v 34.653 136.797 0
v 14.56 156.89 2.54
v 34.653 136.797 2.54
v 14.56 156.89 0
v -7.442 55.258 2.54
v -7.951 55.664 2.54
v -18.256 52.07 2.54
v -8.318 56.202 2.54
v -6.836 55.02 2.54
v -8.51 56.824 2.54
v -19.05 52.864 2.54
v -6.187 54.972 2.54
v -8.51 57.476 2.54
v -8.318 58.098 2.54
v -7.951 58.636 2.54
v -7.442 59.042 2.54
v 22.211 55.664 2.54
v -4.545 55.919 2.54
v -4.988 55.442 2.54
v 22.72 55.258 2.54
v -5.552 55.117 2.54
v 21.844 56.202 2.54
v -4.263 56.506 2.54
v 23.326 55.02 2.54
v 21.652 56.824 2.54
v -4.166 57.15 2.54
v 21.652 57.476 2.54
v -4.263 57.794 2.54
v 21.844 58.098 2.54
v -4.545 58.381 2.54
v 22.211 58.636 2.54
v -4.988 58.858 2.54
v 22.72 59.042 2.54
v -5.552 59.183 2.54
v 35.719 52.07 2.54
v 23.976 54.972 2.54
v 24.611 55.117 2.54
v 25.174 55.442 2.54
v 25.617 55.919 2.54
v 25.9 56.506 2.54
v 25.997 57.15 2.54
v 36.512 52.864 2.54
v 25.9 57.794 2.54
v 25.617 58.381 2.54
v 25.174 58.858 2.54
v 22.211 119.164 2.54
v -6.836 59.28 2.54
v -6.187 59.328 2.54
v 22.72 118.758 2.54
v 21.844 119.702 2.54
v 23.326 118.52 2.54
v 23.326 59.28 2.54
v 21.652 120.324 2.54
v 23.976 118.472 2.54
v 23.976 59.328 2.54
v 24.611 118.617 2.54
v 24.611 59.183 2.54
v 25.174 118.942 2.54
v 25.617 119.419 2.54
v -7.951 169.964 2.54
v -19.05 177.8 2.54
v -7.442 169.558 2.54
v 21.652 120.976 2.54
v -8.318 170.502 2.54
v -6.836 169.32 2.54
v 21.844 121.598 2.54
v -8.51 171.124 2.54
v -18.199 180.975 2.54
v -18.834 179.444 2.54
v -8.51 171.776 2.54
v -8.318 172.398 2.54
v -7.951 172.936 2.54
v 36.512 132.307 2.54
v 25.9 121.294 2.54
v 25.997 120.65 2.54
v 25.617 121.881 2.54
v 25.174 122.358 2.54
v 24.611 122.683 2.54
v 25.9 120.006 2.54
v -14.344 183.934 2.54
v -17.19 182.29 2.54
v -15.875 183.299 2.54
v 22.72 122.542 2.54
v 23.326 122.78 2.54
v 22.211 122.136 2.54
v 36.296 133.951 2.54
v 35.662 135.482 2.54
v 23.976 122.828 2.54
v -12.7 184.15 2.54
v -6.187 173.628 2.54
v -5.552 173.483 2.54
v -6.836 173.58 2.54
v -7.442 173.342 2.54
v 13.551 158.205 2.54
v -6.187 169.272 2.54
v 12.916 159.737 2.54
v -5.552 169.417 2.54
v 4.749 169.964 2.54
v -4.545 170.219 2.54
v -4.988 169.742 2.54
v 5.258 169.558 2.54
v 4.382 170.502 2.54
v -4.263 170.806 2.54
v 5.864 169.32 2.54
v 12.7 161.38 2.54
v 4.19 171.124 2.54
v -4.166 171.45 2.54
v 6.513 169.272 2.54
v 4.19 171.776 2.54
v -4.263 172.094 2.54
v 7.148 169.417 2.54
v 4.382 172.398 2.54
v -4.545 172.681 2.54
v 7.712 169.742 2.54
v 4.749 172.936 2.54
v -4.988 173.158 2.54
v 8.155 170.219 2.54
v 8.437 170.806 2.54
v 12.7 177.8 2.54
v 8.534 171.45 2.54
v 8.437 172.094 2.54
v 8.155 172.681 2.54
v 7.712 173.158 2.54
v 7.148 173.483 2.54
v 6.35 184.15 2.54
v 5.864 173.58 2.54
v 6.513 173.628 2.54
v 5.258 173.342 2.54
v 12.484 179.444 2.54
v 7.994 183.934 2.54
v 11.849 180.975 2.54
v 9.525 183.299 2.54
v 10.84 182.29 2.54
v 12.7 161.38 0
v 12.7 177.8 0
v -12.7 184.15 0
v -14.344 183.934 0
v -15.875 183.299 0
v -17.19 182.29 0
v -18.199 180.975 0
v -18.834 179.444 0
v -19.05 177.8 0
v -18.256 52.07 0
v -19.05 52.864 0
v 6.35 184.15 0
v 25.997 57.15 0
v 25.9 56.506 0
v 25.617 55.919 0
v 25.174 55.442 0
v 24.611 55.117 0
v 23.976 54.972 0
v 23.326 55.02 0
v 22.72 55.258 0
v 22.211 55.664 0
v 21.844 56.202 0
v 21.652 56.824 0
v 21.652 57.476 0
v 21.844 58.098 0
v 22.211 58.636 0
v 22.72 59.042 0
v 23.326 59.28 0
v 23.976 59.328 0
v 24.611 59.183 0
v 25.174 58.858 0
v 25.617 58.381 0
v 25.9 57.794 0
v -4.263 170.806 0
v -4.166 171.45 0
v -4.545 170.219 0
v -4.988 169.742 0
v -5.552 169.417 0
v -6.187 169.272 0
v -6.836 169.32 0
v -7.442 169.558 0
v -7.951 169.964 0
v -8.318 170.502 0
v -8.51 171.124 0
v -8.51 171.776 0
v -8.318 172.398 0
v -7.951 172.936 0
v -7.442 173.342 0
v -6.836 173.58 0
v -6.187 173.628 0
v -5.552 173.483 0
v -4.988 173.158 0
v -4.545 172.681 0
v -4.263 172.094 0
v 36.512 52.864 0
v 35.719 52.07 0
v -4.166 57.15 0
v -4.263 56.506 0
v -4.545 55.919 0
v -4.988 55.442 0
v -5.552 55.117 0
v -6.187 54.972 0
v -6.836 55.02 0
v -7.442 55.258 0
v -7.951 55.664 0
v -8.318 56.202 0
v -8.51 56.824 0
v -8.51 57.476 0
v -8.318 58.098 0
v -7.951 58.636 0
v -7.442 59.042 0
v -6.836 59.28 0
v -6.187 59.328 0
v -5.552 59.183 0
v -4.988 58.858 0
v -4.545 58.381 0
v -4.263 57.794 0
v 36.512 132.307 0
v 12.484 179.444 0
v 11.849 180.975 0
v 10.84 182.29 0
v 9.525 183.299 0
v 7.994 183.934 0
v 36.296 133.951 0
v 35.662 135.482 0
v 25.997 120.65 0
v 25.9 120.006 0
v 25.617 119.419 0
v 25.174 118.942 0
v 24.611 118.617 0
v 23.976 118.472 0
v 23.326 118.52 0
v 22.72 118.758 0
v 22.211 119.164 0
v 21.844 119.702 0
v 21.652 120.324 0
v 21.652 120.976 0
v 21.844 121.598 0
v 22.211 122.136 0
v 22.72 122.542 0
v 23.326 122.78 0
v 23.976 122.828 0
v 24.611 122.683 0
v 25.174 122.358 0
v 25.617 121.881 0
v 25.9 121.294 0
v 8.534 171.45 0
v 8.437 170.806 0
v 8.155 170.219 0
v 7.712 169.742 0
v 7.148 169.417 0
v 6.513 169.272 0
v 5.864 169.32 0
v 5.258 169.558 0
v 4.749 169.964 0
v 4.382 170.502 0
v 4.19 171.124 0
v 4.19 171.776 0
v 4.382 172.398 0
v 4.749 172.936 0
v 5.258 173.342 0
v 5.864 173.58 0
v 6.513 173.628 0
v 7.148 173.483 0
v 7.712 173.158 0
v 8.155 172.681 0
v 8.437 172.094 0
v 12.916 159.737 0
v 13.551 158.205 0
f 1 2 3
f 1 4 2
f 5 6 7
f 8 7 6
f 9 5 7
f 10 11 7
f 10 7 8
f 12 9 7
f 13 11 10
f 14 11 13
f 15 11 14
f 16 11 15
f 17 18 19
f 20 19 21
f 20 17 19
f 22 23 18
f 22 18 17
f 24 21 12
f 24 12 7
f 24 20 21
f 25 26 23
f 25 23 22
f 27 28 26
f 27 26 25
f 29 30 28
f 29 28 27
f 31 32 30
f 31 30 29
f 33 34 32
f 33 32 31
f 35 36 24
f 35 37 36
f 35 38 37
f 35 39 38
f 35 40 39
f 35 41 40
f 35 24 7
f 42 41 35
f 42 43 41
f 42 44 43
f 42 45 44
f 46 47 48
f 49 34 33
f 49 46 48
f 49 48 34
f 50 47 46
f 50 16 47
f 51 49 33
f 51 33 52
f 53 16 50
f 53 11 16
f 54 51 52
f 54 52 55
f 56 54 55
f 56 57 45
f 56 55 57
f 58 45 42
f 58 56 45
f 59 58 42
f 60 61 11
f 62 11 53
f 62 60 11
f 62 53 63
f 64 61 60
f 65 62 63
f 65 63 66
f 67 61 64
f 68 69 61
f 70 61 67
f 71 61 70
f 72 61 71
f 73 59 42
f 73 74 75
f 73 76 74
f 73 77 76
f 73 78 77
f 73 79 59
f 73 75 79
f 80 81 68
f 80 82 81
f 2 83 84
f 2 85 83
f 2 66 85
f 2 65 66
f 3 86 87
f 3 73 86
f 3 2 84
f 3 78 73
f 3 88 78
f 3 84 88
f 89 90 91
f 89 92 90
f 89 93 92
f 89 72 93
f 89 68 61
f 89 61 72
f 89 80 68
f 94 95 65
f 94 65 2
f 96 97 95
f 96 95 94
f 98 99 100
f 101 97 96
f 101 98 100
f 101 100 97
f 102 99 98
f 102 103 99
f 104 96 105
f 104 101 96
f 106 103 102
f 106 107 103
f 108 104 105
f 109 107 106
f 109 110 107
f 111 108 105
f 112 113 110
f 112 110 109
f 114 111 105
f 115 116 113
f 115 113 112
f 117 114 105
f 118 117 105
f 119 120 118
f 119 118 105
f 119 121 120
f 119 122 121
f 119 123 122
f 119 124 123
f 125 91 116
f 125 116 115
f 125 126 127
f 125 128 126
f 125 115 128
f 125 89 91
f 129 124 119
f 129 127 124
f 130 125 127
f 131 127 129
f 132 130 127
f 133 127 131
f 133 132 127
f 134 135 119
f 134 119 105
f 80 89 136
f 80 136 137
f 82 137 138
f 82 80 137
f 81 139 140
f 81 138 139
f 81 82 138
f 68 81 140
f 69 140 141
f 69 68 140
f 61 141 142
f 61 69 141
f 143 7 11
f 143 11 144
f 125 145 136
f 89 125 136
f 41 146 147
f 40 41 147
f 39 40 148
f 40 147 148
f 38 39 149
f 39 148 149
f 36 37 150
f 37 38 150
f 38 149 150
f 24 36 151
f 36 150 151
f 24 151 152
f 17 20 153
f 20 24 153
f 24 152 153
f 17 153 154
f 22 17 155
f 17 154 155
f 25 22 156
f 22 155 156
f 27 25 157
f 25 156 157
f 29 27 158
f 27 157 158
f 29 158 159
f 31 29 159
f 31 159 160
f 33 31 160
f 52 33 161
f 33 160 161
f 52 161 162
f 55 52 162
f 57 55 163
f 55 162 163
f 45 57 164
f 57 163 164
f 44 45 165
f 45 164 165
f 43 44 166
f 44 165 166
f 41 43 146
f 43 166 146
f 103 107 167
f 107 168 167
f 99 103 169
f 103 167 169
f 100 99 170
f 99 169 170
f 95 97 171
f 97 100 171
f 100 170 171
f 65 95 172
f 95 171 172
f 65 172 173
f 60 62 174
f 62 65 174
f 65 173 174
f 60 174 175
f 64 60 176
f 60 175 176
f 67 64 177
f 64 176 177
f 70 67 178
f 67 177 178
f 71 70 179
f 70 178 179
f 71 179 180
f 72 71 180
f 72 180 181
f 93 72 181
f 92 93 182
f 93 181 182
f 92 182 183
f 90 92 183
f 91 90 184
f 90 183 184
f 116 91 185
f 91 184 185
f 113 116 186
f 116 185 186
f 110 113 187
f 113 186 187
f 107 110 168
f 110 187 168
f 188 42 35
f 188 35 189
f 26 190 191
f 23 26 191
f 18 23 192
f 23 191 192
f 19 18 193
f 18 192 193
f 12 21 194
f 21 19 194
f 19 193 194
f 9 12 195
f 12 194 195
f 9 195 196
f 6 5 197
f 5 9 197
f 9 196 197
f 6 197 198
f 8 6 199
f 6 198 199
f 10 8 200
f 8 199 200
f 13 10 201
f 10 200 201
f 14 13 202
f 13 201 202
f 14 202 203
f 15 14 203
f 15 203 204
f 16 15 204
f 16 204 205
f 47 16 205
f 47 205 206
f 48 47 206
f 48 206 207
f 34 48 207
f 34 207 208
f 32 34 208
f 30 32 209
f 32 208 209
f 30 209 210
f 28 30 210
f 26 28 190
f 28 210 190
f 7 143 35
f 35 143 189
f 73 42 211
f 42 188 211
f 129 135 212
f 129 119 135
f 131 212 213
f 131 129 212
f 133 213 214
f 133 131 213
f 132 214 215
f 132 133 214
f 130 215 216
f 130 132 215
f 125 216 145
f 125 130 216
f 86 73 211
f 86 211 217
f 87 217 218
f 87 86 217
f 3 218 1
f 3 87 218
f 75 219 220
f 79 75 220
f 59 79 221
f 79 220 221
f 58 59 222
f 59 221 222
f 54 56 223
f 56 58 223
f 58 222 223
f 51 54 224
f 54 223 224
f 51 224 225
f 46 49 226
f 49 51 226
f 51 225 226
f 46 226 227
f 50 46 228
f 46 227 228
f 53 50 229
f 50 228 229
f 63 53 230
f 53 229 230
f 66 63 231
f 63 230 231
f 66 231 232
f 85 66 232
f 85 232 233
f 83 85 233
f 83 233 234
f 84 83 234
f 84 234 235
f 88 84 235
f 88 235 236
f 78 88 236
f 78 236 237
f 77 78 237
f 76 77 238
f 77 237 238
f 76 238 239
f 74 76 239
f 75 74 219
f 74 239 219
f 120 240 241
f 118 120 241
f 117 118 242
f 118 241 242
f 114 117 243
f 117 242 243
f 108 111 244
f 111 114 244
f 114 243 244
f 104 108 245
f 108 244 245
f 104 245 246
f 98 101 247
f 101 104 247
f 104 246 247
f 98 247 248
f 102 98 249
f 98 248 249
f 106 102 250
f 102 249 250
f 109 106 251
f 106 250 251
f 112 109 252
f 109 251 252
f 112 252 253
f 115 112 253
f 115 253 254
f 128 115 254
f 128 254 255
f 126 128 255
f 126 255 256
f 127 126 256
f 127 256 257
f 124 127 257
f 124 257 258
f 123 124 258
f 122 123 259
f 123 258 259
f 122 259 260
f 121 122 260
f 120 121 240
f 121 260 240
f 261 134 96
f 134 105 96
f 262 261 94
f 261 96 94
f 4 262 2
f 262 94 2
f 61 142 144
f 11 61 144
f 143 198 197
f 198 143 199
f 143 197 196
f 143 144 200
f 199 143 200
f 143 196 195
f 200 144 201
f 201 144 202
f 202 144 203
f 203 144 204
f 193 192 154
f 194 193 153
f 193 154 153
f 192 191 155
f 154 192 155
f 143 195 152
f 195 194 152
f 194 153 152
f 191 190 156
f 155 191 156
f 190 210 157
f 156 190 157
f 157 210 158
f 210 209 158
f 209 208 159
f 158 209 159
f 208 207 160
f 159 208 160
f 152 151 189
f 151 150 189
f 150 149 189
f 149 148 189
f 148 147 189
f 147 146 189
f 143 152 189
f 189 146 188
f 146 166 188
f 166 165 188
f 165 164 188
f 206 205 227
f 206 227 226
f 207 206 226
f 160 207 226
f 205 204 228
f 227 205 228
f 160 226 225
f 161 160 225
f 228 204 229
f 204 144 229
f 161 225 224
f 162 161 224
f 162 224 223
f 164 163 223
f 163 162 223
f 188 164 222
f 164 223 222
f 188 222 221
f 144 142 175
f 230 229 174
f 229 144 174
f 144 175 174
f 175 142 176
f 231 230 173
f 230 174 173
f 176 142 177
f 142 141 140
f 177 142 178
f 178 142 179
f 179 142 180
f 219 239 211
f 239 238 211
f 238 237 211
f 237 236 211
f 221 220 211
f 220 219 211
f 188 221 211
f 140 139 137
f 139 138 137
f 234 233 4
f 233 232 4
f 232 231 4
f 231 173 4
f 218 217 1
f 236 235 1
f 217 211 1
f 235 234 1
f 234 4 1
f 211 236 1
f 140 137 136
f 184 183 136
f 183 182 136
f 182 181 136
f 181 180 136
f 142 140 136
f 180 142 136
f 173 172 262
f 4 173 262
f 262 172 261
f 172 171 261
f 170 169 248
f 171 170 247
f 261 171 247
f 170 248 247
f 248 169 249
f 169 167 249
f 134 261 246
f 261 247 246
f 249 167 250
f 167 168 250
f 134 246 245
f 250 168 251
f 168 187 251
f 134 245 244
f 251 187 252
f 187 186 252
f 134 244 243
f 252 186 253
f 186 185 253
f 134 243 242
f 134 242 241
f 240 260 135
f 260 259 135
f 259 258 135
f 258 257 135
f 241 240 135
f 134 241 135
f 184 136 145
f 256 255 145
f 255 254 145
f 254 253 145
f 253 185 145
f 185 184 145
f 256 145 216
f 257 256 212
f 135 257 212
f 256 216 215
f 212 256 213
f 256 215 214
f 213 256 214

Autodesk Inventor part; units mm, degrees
ref_plane "YZ Plane" through (0, 0, 0) normal (1, 0, 0) x (0, 1, 0)
ref_plane "XZ Plane" through (0, 0, 0) normal (0, 1, 0) x (-1, 0, 0)
ref_plane "XY Plane" through (0, 0, 0) normal (0, 0, 1) x (1, 0, 0)
sketch "Sketch1" plane through (0, 0, 0) normal (0, 0, 1) x (1, 0, 0)
  circle A0 centre (-6.35, 171.45) radius 2.1844 projected
  circle A1 centre (6.35, 171.45) radius 2.1844 projected
  circle A2 centre (23.8125, 120.65) radius 2.1844 projected
  circle A3 centre (23.8125, 57.15) radius 2.1844 projected
  circle A4 centre (-6.35, 57.15) radius 2.1844 projected
  line L0 (-19.05, 52.07) -> (36.5125, 52.07)
  line L1 (36.5125, 52.07) -> (36.5125, 134.9375)
  line L2 (12.7, 184.15) -> (-19.05, 184.15)
  line L3 (-19.05, 184.15) -> (-19.05, 52.07)
  line L4 (12.7, 184.15) -> (12.7, 158.75)
  line L5 (12.7, 158.75) -> (36.5125, 134.9375)
  point P0 (0, 0)
  dimension "d0" = 12.7
  dimension "d2" = 12.7
  dimension "d3" = 5.08
  dimension "d4" = 12.7
  dimension "d15" = 25.4
  dimension "d16" = 31.75
  dimension "d17" = 135
extrude "Extrusion1" add sketch "Sketch1" along normal blind 2.54
fillet "Fillet1" radius 6.35 4 edges at (-19.05, 184.15, 1.27) (12.7, 184.15, 1.27) (12.7, 158.75, 1.27) (36.5125, 134.9375, 1.27)
chamfer "Chamfer1" distance 0.7937 angle 45 2 edges at (36.5125, 52.07, 1.27) (-19.05, 52.07, 1.27)
properties part number "funnelFront" material "white pla"
